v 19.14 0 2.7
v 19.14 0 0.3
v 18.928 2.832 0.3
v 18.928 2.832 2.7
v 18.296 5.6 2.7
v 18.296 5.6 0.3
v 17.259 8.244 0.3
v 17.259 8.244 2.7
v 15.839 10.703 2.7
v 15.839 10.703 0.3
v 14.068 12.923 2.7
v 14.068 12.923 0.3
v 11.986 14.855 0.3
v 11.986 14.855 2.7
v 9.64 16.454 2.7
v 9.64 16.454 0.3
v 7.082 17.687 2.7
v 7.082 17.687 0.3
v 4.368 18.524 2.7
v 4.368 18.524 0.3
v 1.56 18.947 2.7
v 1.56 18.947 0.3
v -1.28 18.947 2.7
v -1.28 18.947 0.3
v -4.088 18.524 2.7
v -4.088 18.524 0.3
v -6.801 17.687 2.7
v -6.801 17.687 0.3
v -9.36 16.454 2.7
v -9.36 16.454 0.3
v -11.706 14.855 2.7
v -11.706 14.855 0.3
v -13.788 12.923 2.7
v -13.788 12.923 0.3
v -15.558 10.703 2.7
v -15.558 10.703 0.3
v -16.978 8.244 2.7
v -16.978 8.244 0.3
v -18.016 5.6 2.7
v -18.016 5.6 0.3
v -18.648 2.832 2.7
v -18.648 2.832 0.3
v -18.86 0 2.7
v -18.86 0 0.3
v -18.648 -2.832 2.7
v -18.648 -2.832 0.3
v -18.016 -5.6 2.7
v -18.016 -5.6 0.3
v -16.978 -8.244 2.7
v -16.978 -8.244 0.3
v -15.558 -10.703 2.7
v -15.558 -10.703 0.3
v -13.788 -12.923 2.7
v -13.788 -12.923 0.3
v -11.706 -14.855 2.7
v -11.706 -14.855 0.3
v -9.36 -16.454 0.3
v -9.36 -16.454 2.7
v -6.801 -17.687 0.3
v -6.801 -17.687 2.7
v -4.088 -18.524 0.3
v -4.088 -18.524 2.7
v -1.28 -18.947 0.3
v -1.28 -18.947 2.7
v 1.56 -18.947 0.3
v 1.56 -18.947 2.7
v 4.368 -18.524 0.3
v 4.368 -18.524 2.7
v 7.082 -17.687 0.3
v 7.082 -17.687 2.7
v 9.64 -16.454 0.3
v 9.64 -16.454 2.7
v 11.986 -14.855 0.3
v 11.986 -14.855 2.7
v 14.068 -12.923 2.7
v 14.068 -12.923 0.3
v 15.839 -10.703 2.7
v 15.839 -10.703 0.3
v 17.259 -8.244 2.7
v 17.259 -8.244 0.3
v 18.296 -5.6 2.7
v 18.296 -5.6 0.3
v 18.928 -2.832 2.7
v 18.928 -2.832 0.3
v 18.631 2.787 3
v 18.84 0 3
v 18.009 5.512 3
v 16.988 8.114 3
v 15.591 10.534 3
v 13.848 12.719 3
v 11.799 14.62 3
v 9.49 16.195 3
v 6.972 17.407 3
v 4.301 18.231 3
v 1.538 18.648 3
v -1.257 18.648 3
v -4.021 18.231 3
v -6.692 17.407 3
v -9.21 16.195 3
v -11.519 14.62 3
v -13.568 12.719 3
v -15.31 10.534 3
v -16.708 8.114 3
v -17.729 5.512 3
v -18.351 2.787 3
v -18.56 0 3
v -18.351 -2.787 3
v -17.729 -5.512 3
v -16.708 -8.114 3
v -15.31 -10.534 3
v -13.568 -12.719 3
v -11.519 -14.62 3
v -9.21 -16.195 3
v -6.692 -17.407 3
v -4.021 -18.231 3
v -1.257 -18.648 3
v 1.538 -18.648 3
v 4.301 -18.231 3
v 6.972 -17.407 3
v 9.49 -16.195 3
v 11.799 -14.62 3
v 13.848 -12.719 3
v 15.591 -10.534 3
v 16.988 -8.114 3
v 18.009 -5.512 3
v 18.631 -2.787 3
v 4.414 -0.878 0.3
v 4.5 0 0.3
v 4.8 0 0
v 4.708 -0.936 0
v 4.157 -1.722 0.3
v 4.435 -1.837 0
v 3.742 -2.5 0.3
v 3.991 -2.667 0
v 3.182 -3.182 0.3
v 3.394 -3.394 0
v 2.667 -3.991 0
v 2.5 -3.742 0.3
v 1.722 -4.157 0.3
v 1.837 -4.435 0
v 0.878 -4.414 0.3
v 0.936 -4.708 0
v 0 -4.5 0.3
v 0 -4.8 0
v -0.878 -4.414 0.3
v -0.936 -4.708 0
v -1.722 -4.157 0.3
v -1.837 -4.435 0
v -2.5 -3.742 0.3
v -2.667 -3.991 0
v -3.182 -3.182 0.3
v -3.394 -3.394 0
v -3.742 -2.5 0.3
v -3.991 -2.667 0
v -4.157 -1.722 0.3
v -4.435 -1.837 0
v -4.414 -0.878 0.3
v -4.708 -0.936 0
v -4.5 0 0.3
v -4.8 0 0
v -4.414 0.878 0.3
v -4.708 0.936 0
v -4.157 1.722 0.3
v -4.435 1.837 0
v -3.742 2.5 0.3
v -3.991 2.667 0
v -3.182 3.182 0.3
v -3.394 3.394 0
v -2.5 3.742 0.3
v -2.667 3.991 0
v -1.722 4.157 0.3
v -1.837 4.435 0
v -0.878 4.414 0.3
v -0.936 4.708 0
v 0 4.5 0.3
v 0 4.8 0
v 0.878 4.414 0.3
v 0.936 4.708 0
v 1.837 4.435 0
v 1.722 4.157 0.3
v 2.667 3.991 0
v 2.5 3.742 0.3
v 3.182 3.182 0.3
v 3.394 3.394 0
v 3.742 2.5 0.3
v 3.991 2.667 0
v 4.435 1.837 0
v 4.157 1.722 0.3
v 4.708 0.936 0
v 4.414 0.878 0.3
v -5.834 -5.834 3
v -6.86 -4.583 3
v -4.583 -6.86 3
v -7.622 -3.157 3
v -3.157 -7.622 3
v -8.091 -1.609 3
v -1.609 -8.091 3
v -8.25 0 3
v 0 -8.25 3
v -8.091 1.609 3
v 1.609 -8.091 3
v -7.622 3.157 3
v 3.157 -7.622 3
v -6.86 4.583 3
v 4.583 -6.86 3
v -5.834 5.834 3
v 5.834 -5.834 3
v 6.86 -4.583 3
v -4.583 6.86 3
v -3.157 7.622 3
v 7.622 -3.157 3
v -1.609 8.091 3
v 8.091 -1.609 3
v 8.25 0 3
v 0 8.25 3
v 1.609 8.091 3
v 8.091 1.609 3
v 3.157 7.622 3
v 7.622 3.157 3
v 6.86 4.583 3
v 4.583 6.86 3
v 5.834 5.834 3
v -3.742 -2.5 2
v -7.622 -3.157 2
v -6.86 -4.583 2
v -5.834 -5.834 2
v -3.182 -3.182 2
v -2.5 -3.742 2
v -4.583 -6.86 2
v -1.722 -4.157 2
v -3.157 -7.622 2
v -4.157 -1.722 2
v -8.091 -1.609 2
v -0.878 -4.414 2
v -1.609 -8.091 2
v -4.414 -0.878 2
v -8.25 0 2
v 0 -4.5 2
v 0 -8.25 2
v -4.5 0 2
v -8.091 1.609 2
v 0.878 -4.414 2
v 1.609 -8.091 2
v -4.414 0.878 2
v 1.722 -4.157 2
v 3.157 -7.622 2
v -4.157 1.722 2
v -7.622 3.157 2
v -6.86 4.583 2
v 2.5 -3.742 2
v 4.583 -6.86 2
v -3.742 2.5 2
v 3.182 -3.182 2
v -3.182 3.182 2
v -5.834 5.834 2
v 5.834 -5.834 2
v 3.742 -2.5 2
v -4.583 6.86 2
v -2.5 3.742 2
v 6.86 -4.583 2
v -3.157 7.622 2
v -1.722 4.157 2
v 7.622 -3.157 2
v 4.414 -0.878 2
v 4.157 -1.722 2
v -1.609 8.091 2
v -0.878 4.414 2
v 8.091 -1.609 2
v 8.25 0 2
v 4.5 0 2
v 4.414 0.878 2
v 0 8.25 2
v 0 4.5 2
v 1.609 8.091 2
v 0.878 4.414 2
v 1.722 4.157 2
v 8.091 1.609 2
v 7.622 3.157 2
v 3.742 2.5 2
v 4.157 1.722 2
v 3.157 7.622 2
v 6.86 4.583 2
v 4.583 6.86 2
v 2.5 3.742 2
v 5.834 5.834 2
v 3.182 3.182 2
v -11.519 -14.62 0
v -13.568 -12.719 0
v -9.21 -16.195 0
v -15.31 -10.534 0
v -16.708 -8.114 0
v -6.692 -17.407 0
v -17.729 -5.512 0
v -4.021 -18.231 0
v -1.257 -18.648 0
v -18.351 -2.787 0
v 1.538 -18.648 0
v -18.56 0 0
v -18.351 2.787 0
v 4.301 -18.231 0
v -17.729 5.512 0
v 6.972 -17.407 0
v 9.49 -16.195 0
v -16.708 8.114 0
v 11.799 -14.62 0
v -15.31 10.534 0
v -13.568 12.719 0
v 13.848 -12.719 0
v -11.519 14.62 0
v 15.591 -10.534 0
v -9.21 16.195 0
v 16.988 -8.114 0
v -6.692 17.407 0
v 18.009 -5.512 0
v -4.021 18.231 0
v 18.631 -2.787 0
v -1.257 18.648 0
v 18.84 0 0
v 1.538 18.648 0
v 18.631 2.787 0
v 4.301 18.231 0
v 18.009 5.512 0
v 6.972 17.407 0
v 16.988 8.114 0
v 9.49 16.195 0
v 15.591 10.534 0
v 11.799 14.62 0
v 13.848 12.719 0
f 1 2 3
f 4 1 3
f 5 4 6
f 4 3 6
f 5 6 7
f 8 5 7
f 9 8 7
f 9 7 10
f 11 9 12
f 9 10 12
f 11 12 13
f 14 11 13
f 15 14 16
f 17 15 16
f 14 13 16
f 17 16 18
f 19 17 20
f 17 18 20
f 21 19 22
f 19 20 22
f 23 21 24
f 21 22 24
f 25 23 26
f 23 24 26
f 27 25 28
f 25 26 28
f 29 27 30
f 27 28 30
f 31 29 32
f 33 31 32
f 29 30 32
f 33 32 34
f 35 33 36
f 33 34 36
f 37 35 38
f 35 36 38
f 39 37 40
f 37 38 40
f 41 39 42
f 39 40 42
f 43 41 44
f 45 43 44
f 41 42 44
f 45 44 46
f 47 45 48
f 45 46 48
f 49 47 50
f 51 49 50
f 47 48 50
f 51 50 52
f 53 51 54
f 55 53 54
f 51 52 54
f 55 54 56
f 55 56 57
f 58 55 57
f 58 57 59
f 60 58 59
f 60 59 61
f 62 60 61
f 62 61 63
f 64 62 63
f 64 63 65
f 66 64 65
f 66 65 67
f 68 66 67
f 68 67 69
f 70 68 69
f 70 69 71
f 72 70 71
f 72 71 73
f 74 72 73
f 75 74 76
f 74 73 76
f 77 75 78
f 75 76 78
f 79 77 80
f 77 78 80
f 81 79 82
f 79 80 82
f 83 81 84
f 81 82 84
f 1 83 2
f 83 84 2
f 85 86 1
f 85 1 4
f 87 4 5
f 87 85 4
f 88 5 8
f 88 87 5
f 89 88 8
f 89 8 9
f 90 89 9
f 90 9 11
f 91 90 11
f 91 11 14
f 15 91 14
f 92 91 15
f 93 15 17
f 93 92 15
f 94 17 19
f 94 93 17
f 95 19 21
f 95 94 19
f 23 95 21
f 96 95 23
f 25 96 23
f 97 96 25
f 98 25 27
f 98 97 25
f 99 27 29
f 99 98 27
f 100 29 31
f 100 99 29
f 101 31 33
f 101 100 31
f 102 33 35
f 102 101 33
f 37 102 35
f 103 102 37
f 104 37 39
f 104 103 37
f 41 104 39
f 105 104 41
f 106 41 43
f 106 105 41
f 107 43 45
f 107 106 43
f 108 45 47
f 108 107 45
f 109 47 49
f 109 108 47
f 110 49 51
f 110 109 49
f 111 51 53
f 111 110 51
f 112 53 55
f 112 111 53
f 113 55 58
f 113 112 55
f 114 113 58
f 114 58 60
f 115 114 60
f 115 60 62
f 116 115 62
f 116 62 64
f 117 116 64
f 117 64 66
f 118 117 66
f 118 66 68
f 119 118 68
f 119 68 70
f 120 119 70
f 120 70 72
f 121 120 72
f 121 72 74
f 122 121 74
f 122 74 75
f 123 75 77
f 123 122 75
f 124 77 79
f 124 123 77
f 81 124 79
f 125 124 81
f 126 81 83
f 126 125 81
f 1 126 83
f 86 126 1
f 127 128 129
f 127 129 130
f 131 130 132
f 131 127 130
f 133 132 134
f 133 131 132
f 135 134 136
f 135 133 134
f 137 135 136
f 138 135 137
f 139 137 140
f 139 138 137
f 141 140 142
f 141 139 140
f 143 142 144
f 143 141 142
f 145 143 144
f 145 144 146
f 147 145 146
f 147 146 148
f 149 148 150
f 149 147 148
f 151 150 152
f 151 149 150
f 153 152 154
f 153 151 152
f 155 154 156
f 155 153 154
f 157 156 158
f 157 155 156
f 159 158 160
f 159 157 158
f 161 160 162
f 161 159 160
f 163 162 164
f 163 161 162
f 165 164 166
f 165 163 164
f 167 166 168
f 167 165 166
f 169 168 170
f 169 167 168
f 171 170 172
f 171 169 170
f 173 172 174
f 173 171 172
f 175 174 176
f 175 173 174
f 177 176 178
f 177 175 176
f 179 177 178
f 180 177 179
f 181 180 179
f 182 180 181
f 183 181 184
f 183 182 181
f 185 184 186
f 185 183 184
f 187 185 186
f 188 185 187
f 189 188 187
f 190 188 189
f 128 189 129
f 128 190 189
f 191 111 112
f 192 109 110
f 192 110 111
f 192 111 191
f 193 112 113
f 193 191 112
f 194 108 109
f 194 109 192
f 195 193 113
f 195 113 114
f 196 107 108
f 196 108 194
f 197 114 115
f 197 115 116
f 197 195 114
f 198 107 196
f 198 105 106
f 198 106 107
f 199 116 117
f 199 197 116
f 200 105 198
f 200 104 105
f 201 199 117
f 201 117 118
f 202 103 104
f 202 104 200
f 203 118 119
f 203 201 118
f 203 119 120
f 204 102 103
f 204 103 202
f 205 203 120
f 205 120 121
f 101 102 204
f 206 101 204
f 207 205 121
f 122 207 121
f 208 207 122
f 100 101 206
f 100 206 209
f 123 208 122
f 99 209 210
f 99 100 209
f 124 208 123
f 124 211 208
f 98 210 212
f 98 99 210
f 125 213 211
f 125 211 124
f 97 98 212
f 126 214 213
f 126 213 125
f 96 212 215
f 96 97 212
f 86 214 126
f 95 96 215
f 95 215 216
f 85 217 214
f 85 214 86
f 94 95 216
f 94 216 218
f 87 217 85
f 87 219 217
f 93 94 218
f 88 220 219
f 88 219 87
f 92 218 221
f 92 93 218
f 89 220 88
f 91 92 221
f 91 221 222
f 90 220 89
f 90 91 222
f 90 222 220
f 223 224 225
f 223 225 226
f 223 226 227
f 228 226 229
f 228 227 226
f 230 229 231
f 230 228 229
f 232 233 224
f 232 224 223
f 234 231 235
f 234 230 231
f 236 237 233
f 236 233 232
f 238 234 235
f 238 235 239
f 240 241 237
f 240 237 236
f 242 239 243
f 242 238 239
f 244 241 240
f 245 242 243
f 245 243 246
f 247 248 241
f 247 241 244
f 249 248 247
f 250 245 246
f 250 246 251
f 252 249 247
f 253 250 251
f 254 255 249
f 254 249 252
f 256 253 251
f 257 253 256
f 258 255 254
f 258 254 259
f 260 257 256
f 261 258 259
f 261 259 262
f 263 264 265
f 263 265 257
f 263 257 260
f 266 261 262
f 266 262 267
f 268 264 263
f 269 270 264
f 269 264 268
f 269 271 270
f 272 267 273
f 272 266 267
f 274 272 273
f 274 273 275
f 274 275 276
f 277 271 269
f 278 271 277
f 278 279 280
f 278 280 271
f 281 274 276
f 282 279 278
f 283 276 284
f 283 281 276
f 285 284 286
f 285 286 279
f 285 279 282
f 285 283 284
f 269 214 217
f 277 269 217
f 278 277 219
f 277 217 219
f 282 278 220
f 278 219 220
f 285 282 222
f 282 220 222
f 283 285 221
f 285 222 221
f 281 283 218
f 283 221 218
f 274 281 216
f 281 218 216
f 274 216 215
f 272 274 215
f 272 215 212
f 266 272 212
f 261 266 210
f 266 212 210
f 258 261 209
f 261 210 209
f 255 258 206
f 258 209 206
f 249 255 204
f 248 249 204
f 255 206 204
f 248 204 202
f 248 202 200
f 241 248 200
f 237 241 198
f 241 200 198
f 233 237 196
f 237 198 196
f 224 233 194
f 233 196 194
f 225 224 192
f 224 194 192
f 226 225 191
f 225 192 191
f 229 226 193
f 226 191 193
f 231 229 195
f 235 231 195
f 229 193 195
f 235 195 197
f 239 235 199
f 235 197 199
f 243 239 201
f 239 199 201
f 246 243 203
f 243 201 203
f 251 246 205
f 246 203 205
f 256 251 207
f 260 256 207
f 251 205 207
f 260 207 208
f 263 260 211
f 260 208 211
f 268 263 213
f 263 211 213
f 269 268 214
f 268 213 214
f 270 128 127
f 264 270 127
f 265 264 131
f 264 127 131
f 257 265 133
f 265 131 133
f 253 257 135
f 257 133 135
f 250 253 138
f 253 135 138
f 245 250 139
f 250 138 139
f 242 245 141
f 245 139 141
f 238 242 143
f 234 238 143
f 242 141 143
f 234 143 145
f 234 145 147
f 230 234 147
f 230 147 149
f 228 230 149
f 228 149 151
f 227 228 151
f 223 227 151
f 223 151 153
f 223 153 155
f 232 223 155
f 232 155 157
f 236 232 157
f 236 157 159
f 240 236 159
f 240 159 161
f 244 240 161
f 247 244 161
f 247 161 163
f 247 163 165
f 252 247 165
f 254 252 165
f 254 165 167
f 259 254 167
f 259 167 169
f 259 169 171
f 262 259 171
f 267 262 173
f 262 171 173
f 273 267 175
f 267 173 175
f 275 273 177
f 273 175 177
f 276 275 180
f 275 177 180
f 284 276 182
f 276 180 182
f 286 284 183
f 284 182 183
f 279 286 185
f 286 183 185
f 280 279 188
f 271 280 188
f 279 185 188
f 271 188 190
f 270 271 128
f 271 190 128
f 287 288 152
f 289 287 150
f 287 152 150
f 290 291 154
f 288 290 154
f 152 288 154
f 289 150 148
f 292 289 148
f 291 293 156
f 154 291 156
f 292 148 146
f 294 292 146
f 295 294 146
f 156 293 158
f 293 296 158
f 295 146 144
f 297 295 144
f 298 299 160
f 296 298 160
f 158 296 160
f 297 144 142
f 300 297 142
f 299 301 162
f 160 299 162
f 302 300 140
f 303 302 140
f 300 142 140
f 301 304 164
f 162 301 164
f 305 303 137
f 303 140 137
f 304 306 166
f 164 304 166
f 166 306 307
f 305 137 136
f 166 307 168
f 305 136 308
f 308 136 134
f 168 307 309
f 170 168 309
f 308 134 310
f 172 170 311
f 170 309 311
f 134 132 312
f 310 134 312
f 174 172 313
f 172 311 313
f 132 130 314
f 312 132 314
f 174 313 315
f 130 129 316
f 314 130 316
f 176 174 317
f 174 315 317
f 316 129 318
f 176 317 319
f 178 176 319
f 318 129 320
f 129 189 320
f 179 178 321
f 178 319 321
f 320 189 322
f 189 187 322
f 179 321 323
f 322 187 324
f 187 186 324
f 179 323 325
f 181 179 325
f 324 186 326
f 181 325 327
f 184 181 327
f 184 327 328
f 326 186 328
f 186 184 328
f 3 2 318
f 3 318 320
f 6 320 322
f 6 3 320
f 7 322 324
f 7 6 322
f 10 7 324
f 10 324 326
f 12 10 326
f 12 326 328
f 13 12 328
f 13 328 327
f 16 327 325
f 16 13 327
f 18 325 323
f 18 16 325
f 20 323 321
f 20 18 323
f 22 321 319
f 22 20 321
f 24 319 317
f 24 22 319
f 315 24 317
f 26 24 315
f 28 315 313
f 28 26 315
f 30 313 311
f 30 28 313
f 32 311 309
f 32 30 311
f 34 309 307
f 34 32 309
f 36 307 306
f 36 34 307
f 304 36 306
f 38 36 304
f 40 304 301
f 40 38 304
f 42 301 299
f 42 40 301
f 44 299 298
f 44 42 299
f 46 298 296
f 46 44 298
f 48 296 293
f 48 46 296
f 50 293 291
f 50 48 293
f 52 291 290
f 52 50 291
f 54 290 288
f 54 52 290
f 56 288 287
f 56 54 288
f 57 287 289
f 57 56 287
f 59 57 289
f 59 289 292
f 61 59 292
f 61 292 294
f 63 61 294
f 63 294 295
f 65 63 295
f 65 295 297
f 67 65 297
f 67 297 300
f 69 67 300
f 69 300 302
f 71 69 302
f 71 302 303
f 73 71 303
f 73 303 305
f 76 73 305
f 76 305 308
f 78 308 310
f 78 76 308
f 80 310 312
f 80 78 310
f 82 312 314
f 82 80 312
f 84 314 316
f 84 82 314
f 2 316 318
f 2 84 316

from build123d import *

# Parameters (mm, degrees)
SKETCH068_R     = 19
PAD025_DEPTH    = 3
SKETCH069_R     = 4.5
POCKET042_DEPTH = 3.001
CHAMFER029_SIZE = 0.3
CHAMFER030_SIZE = 0.3
SKETCH070_R     = 8.25
POCKET043_DEPTH = 1


with BuildPart() as part:
    # Sketch068 → Pad025 (new body)
    with BuildSketch(Plane.XY):
        with Locations((0.140173, 0)):
            Circle(SKETCH068_R)
    extrude(amount=PAD025_DEPTH)

    # Sketch069 (on Face2 of Pad025) → Pocket042 (cut, through all)
    with BuildSketch(Plane(origin=(0, 0, 0), x_dir=(1, 0, 0), z_dir=(0, 0, -1))):
        Circle(SKETCH069_R)
    extrude(amount=-POCKET042_DEPTH, mode=Mode.SUBTRACT)

    # Chamfer029
    chamfer029_edges = [part.edges().sort_by_distance(p)[0] for p in [
        (-4.5, 0, 0),
        (-4.5, 0, 3),
    ]]
    chamfer(chamfer029_edges, length=CHAMFER029_SIZE)

    # Chamfer030
    chamfer030_edges = [part.edges().sort_by_distance(p)[0] for p in [
        (-18.859827, 0, 0),
        (-18.859827, 0, 3),
    ]]
    chamfer(chamfer030_edges, length=CHAMFER030_SIZE)

    # Sketch070 (on Face8 of Chamfer030) → Pocket043 (cut)
    with BuildSketch(Plane.XY.offset(3)):
        Circle(SKETCH070_R)
    extrude(amount=-POCKET043_DEPTH, mode=Mode.SUBTRACT)


solid = part.part
